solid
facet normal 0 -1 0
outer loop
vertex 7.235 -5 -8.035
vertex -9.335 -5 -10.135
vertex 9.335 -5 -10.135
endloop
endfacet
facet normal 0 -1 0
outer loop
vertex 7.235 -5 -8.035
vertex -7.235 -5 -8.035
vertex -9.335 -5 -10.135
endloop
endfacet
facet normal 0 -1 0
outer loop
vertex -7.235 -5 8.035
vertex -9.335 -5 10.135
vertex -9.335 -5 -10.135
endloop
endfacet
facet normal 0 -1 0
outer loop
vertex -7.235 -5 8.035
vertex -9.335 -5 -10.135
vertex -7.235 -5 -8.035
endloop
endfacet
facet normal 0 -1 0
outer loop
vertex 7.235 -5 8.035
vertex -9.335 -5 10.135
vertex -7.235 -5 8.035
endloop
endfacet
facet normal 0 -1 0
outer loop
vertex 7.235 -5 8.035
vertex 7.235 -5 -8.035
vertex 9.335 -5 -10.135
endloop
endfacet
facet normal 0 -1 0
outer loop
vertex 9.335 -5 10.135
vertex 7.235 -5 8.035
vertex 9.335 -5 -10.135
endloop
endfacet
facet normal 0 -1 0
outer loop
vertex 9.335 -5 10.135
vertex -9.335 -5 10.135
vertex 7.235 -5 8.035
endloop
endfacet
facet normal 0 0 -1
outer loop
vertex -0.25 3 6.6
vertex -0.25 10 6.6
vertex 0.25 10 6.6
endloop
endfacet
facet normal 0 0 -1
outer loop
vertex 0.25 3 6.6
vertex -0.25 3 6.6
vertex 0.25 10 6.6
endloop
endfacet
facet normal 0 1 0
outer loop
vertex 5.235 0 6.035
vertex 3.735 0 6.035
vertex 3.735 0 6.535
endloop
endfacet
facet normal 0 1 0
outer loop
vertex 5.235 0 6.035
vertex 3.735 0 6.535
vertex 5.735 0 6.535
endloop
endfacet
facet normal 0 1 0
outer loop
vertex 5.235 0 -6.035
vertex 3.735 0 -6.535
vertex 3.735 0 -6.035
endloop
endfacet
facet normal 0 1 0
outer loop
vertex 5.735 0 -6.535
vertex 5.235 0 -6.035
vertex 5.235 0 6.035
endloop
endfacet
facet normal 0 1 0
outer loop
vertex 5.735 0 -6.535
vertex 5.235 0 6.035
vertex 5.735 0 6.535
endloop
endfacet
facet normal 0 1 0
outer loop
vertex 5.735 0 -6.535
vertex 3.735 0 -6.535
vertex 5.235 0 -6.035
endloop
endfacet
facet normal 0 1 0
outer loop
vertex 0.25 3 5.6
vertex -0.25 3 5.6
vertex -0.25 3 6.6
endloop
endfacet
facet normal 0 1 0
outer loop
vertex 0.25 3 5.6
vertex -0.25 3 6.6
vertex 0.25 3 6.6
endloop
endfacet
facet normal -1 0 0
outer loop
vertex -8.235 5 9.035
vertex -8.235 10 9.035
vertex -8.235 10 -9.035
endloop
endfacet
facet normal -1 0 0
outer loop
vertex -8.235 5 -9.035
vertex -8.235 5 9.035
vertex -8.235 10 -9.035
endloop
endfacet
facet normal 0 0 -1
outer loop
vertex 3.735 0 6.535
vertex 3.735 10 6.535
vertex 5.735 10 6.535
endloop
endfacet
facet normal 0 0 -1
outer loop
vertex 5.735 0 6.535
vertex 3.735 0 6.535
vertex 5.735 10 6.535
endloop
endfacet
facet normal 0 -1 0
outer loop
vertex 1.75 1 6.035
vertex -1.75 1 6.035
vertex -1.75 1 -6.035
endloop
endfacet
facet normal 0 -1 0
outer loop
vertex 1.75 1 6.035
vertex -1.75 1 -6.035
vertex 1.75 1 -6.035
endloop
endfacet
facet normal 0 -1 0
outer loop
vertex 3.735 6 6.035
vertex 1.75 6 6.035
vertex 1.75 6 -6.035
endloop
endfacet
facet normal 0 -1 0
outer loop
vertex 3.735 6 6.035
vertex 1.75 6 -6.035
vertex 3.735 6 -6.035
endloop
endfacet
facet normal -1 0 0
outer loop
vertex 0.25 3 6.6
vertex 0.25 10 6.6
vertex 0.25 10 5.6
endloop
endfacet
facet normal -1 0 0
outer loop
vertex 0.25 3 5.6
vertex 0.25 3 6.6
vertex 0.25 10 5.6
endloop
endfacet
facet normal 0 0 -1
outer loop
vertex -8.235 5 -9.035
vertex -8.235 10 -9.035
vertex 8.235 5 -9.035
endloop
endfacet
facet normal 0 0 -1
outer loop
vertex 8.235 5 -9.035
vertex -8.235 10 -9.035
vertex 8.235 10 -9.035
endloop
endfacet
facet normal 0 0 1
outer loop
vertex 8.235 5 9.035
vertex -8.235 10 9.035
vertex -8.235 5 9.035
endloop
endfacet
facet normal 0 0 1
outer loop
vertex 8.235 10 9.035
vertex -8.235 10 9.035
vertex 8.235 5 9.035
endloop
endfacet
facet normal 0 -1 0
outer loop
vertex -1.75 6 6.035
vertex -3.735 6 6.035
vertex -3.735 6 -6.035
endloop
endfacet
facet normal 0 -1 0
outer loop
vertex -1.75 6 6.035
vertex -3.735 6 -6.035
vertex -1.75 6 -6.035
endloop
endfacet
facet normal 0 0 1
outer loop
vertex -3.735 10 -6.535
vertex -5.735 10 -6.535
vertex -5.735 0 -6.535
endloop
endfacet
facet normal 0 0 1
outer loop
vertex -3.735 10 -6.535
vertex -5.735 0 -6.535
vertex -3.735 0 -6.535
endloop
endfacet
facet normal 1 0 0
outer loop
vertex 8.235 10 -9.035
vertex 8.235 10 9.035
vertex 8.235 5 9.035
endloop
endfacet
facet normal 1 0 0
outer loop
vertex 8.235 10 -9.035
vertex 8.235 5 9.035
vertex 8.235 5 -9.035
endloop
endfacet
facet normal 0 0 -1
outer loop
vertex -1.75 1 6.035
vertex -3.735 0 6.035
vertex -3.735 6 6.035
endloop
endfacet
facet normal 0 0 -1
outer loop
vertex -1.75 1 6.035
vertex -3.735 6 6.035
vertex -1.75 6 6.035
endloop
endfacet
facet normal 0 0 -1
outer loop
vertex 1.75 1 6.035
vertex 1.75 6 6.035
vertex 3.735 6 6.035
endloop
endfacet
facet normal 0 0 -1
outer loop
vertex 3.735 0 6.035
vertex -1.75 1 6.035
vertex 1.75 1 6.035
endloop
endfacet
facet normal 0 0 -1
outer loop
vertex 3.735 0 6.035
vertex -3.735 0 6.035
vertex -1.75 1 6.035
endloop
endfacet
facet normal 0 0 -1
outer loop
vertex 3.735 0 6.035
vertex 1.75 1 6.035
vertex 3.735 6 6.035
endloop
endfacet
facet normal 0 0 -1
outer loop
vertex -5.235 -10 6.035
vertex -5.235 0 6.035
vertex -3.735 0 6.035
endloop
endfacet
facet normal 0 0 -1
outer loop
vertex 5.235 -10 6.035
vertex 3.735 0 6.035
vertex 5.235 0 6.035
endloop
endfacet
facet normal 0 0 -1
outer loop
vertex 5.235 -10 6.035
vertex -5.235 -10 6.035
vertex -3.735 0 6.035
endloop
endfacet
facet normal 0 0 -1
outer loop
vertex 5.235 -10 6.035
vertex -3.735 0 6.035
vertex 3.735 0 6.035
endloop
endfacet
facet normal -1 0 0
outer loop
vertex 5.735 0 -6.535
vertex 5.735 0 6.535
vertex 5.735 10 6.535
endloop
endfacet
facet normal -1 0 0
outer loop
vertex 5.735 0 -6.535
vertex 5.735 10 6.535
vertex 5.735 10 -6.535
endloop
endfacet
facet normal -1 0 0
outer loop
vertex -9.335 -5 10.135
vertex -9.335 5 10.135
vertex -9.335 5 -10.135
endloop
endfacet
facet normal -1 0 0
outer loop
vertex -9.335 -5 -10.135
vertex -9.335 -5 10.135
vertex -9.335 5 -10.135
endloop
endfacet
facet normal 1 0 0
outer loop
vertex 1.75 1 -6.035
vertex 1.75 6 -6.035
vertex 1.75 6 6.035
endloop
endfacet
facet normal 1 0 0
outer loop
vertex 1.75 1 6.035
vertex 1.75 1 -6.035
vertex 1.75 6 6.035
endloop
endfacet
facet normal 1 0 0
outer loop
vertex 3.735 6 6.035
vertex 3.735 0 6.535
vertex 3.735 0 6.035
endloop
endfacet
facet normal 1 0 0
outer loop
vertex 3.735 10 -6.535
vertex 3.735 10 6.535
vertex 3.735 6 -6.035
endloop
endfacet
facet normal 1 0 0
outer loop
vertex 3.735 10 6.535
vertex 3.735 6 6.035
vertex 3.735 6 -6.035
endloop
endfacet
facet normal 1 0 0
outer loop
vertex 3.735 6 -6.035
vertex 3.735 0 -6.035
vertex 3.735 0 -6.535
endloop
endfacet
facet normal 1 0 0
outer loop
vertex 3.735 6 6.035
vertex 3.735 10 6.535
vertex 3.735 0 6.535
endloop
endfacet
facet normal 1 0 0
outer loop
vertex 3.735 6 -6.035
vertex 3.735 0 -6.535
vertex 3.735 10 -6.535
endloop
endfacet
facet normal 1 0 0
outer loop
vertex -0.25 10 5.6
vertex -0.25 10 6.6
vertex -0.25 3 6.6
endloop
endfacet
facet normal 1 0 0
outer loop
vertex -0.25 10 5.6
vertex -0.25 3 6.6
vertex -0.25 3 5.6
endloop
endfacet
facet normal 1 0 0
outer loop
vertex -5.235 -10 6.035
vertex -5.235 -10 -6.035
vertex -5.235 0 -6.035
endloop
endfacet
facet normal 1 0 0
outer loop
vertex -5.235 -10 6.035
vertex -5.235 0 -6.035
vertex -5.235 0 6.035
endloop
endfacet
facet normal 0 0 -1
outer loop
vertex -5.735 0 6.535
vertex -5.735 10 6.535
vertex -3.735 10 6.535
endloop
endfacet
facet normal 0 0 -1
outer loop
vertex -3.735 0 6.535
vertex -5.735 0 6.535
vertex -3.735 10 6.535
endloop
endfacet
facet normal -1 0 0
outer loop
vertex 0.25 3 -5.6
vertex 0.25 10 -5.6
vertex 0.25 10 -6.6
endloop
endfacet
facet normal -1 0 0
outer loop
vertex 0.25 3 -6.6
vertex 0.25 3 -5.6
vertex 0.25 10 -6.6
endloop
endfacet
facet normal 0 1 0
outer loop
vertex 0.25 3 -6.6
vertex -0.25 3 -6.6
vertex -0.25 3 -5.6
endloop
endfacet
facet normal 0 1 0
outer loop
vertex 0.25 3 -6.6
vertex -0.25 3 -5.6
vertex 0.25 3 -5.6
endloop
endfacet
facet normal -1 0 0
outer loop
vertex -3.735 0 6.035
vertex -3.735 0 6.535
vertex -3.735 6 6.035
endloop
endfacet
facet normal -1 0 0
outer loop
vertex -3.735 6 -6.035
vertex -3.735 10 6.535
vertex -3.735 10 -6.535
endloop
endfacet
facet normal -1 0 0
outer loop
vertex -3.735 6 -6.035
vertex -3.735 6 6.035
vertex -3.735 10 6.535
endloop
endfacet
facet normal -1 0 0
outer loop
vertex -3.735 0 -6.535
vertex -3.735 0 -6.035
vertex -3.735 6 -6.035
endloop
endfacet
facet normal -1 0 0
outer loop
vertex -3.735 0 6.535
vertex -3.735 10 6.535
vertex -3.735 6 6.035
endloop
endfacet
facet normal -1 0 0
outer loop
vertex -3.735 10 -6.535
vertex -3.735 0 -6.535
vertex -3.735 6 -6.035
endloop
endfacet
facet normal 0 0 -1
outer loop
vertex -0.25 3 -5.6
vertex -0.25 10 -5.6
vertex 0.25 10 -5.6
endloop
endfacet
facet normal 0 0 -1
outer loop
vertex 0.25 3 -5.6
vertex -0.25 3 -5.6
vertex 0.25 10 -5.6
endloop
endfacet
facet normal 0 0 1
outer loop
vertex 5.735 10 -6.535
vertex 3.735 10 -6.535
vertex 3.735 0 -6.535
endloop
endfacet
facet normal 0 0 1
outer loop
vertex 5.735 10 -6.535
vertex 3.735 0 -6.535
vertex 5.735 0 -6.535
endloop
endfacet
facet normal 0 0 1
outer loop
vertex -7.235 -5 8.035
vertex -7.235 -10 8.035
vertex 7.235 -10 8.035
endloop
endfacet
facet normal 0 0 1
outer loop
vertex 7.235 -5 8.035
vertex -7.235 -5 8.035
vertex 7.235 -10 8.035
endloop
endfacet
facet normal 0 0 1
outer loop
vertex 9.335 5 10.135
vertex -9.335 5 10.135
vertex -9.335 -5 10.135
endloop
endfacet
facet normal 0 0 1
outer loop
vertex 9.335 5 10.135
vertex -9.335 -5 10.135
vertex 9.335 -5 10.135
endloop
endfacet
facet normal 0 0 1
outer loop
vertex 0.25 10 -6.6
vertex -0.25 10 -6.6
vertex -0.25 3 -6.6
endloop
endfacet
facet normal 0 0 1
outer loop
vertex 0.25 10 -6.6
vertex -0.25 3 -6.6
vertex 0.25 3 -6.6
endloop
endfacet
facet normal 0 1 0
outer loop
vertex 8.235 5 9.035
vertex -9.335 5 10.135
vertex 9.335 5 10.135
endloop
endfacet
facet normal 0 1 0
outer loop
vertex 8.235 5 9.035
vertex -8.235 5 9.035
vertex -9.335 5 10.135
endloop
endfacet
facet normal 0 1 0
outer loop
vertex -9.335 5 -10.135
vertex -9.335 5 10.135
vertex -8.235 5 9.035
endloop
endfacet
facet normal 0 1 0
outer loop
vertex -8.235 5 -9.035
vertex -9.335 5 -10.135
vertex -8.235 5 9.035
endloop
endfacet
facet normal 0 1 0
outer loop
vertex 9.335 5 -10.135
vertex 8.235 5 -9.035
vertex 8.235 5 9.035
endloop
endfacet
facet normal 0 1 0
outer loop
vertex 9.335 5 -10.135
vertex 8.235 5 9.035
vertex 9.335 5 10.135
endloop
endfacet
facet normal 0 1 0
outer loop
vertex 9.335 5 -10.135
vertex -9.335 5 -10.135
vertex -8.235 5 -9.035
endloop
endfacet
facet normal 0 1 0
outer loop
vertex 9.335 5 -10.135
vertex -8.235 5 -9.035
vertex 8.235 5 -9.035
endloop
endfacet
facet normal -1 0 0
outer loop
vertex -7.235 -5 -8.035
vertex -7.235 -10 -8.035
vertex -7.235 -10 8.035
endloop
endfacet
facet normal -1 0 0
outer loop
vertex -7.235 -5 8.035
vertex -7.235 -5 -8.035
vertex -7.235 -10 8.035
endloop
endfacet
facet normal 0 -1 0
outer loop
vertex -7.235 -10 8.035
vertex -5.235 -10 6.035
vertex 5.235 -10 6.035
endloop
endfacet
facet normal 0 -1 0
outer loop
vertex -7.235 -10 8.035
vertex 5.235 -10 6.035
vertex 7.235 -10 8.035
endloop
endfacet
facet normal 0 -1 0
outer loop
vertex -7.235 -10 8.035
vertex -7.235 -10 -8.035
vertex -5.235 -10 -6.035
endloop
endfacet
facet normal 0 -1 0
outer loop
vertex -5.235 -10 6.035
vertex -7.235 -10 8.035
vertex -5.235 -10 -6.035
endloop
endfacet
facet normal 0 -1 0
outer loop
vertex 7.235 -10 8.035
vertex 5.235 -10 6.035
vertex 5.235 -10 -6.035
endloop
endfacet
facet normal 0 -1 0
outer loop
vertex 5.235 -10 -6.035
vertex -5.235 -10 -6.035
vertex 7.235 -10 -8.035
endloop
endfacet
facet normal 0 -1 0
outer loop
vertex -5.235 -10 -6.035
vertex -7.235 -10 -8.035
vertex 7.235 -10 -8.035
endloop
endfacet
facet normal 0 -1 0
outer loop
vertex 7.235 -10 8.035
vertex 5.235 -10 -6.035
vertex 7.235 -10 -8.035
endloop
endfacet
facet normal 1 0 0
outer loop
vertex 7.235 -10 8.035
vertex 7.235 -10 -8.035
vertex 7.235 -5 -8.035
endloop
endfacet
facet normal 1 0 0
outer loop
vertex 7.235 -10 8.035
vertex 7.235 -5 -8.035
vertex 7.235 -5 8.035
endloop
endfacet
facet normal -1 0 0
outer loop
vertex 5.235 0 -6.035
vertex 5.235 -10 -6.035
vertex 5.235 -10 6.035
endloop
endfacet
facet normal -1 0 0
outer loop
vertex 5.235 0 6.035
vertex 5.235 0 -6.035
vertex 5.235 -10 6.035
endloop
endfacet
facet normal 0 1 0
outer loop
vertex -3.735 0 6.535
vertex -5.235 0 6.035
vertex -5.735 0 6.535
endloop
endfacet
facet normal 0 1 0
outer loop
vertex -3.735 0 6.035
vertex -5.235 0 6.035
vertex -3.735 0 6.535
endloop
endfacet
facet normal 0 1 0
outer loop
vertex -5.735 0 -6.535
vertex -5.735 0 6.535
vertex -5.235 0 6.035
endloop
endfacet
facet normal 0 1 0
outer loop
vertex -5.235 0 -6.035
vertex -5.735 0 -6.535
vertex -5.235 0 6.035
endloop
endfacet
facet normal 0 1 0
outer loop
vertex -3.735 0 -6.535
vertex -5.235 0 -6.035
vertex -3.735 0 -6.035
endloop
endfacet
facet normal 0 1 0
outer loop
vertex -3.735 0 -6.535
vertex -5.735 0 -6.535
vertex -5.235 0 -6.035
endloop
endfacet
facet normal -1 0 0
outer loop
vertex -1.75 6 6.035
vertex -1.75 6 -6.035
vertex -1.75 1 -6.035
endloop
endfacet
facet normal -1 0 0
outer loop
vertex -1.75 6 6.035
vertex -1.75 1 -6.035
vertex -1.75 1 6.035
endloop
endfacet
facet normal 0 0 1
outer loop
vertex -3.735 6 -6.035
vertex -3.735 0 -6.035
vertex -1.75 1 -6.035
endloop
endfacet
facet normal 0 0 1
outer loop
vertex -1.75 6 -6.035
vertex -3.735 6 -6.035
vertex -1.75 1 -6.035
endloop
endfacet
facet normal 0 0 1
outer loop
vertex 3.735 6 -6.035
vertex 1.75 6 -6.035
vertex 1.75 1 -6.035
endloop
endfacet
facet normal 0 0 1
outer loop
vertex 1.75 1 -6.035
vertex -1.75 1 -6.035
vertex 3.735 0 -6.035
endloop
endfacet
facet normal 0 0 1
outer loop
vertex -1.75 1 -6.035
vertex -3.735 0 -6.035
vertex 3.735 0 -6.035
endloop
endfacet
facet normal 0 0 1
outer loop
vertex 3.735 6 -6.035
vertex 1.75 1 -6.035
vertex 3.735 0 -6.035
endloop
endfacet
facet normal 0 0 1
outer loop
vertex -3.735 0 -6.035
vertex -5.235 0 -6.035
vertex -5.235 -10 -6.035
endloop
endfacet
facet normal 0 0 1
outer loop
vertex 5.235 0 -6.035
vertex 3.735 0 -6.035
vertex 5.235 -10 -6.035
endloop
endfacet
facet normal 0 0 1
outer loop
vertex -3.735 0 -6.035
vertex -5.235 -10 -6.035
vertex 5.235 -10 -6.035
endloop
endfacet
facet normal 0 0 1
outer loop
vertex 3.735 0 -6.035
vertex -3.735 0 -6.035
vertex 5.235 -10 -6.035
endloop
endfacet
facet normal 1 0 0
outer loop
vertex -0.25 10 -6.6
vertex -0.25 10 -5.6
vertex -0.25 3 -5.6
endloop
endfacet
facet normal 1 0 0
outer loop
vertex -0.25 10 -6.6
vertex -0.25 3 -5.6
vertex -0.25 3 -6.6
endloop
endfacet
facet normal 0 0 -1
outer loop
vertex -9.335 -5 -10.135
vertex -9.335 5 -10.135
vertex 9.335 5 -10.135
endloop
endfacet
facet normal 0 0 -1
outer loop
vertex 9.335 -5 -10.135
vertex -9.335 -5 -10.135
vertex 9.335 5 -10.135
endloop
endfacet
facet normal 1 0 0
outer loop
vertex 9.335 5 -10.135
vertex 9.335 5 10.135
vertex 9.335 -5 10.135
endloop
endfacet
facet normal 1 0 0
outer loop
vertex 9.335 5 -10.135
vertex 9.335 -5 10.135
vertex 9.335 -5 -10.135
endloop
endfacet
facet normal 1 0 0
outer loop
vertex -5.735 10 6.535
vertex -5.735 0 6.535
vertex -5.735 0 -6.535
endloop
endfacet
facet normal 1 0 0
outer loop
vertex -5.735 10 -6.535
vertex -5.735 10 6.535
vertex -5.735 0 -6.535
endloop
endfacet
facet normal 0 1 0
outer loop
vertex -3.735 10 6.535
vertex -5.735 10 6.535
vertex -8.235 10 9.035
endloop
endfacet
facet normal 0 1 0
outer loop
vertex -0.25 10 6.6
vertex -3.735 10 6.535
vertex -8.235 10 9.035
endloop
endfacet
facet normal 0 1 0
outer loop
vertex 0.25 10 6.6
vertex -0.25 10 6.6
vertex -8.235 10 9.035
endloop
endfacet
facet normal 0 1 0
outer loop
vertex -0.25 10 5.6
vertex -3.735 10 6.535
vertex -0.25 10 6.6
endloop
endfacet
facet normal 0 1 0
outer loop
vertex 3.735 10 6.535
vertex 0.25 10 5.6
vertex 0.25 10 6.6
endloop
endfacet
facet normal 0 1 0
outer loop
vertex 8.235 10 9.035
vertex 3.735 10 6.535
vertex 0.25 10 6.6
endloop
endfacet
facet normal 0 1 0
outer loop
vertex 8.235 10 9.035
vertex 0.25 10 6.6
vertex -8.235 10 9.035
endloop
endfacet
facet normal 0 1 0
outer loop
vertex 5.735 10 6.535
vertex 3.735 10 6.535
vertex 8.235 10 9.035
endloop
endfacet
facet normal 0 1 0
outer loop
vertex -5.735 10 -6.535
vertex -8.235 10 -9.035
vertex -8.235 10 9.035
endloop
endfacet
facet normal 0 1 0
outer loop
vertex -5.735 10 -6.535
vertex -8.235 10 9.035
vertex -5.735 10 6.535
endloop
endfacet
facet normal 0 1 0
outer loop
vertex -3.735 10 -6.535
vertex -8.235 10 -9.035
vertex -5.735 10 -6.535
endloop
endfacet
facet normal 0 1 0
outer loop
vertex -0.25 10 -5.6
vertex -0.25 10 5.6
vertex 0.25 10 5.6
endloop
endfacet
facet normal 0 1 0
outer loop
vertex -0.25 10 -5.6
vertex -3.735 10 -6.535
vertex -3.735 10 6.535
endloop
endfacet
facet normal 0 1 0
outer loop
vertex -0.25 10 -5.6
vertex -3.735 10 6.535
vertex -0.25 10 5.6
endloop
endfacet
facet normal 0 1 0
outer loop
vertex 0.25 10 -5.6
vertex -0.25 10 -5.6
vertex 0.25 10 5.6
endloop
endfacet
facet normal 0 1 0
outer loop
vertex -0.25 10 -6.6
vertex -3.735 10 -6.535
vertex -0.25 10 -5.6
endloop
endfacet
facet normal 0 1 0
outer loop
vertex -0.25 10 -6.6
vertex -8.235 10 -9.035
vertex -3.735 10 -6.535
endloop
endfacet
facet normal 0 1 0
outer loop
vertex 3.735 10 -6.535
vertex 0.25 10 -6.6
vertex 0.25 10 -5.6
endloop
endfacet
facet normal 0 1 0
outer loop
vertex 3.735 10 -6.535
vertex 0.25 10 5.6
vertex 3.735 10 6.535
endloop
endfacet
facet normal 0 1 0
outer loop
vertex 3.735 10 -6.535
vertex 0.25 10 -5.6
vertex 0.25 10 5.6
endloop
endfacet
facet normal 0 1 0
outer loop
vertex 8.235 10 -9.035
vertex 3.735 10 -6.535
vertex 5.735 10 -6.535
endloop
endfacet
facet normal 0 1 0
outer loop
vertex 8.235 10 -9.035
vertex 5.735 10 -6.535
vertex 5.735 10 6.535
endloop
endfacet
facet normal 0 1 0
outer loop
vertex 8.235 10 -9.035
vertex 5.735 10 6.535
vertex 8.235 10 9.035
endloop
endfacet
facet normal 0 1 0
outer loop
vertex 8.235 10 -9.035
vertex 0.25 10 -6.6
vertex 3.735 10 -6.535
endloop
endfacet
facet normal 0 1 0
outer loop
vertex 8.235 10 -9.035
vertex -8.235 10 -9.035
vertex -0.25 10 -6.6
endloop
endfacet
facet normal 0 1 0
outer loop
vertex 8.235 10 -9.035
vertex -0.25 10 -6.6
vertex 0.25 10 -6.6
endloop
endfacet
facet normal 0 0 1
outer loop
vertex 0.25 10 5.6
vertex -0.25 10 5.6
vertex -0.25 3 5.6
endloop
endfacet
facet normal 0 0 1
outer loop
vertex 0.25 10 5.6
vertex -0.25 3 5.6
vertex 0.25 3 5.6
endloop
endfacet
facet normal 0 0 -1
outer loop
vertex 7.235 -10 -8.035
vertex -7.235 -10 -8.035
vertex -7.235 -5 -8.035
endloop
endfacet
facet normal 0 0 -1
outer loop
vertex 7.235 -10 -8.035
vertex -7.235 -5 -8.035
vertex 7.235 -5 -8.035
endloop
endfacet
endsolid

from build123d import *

# Parameters (mm, degrees)
SKETCH1_W           = 18.67
SKETCH1_H           = 20.27
BOSS_EXTRUDE1_DEPTH = 10
SKETCH2_W           = 18.67
SKETCH2_H           = 20.27
SKETCH2_W_2         = 16.47
SKETCH2_H_2         = 18.07
CUT_EXTRUDE1_DEPTH  = 5
SKETCH7_W           = 18.67
SKETCH7_H           = 20.27
SKETCH7_W_2         = 14.47
SKETCH7_H_2         = 16.07
CUT_EXTRUDE5_DEPTH  = 5
SKETCH3_W           = 10.47
SKETCH3_H           = 12.07
CUT_EXTRUDE2_DEPTH  = 16
CUT_EXTRUDE3_START  = -10
SKETCH4_W           = 2
SKETCH4_H           = 13.07
CUT_EXTRUDE3_DEPTH  = 10
SKETCH6_W           = 3.5
SKETCH6_H           = 12.07
BOSS_EXTRUDE2_DEPTH = 5
SKETCH5_W           = 0.5
SKETCH5_H           = 1
CUT_EXTRUDE4_DEPTH  = 7


with BuildPart() as part:
    # Sketch1 → Boss-Extrude1 (new body, symmetric)
    with BuildSketch(Plane(origin=(0, 0, 0), x_dir=(1, 0, 0), z_dir=(0, 1, 0))):
        Rectangle(SKETCH1_W, SKETCH1_H)
    extrude(amount=BOSS_EXTRUDE1_DEPTH, both=True)

    # Sketch2 → Cut-Extrude1 (cut)
    with BuildSketch(Plane(origin=(0, 10, 0), x_dir=(1, 0, 0), z_dir=(0, 1, 0))):
        Rectangle(SKETCH2_W, SKETCH2_H)
        Rectangle(SKETCH2_W_2, SKETCH2_H_2, mode=Mode.SUBTRACT)
    extrude(amount=-CUT_EXTRUDE1_DEPTH, mode=Mode.SUBTRACT)

    # Sketch7 → Cut-Extrude5 (cut)
    with BuildSketch(Plane.XZ.offset(10)):
        Rectangle(SKETCH7_W, SKETCH7_H)
        Rectangle(SKETCH7_W_2, SKETCH7_H_2, mode=Mode.SUBTRACT)
    extrude(amount=-CUT_EXTRUDE5_DEPTH, mode=Mode.SUBTRACT)

    # Sketch3 → Cut-Extrude2 (cut)
    with BuildSketch(Plane.XZ.offset(10)):
        Rectangle(SKETCH3_W, SKETCH3_H)
    extrude(amount=-CUT_EXTRUDE2_DEPTH, mode=Mode.SUBTRACT)

    # Sketch4 → Cut-Extrude3 (cut)
    with BuildSketch(Plane(origin=(0, 10, 0), x_dir=(1, 0, 0), z_dir=(0, 1, 0)).offset(CUT_EXTRUDE3_START)):
        with Locations((-4.735, 0)):
            Rectangle(SKETCH4_W, SKETCH4_H)
        with Locations((4.735, 0)):
            Rectangle(SKETCH4_W, SKETCH4_H)
    extrude(amount=CUT_EXTRUDE3_DEPTH, mode=Mode.SUBTRACT)

    # Sketch6 → Boss-Extrude2 (add)
    with BuildSketch(Plane.XZ.offset(-6)):
        Rectangle(SKETCH6_W, SKETCH6_H)
    extrude(amount=BOSS_EXTRUDE2_DEPTH)

    # Sketch5 → Cut-Extrude4 (cut)
    with BuildSketch(Plane(origin=(0, 10, 0), x_dir=(1, 0, 0), z_dir=(0, 1, 0))):
        with Locations((0, -6.1)):
            Rectangle(SKETCH5_W, SKETCH5_H)
        with Locations((0, 6.1)):
            Rectangle(SKETCH5_W, SKETCH5_H)
    extrude(amount=-CUT_EXTRUDE4_DEPTH, mode=Mode.SUBTRACT)


solid = part.part
